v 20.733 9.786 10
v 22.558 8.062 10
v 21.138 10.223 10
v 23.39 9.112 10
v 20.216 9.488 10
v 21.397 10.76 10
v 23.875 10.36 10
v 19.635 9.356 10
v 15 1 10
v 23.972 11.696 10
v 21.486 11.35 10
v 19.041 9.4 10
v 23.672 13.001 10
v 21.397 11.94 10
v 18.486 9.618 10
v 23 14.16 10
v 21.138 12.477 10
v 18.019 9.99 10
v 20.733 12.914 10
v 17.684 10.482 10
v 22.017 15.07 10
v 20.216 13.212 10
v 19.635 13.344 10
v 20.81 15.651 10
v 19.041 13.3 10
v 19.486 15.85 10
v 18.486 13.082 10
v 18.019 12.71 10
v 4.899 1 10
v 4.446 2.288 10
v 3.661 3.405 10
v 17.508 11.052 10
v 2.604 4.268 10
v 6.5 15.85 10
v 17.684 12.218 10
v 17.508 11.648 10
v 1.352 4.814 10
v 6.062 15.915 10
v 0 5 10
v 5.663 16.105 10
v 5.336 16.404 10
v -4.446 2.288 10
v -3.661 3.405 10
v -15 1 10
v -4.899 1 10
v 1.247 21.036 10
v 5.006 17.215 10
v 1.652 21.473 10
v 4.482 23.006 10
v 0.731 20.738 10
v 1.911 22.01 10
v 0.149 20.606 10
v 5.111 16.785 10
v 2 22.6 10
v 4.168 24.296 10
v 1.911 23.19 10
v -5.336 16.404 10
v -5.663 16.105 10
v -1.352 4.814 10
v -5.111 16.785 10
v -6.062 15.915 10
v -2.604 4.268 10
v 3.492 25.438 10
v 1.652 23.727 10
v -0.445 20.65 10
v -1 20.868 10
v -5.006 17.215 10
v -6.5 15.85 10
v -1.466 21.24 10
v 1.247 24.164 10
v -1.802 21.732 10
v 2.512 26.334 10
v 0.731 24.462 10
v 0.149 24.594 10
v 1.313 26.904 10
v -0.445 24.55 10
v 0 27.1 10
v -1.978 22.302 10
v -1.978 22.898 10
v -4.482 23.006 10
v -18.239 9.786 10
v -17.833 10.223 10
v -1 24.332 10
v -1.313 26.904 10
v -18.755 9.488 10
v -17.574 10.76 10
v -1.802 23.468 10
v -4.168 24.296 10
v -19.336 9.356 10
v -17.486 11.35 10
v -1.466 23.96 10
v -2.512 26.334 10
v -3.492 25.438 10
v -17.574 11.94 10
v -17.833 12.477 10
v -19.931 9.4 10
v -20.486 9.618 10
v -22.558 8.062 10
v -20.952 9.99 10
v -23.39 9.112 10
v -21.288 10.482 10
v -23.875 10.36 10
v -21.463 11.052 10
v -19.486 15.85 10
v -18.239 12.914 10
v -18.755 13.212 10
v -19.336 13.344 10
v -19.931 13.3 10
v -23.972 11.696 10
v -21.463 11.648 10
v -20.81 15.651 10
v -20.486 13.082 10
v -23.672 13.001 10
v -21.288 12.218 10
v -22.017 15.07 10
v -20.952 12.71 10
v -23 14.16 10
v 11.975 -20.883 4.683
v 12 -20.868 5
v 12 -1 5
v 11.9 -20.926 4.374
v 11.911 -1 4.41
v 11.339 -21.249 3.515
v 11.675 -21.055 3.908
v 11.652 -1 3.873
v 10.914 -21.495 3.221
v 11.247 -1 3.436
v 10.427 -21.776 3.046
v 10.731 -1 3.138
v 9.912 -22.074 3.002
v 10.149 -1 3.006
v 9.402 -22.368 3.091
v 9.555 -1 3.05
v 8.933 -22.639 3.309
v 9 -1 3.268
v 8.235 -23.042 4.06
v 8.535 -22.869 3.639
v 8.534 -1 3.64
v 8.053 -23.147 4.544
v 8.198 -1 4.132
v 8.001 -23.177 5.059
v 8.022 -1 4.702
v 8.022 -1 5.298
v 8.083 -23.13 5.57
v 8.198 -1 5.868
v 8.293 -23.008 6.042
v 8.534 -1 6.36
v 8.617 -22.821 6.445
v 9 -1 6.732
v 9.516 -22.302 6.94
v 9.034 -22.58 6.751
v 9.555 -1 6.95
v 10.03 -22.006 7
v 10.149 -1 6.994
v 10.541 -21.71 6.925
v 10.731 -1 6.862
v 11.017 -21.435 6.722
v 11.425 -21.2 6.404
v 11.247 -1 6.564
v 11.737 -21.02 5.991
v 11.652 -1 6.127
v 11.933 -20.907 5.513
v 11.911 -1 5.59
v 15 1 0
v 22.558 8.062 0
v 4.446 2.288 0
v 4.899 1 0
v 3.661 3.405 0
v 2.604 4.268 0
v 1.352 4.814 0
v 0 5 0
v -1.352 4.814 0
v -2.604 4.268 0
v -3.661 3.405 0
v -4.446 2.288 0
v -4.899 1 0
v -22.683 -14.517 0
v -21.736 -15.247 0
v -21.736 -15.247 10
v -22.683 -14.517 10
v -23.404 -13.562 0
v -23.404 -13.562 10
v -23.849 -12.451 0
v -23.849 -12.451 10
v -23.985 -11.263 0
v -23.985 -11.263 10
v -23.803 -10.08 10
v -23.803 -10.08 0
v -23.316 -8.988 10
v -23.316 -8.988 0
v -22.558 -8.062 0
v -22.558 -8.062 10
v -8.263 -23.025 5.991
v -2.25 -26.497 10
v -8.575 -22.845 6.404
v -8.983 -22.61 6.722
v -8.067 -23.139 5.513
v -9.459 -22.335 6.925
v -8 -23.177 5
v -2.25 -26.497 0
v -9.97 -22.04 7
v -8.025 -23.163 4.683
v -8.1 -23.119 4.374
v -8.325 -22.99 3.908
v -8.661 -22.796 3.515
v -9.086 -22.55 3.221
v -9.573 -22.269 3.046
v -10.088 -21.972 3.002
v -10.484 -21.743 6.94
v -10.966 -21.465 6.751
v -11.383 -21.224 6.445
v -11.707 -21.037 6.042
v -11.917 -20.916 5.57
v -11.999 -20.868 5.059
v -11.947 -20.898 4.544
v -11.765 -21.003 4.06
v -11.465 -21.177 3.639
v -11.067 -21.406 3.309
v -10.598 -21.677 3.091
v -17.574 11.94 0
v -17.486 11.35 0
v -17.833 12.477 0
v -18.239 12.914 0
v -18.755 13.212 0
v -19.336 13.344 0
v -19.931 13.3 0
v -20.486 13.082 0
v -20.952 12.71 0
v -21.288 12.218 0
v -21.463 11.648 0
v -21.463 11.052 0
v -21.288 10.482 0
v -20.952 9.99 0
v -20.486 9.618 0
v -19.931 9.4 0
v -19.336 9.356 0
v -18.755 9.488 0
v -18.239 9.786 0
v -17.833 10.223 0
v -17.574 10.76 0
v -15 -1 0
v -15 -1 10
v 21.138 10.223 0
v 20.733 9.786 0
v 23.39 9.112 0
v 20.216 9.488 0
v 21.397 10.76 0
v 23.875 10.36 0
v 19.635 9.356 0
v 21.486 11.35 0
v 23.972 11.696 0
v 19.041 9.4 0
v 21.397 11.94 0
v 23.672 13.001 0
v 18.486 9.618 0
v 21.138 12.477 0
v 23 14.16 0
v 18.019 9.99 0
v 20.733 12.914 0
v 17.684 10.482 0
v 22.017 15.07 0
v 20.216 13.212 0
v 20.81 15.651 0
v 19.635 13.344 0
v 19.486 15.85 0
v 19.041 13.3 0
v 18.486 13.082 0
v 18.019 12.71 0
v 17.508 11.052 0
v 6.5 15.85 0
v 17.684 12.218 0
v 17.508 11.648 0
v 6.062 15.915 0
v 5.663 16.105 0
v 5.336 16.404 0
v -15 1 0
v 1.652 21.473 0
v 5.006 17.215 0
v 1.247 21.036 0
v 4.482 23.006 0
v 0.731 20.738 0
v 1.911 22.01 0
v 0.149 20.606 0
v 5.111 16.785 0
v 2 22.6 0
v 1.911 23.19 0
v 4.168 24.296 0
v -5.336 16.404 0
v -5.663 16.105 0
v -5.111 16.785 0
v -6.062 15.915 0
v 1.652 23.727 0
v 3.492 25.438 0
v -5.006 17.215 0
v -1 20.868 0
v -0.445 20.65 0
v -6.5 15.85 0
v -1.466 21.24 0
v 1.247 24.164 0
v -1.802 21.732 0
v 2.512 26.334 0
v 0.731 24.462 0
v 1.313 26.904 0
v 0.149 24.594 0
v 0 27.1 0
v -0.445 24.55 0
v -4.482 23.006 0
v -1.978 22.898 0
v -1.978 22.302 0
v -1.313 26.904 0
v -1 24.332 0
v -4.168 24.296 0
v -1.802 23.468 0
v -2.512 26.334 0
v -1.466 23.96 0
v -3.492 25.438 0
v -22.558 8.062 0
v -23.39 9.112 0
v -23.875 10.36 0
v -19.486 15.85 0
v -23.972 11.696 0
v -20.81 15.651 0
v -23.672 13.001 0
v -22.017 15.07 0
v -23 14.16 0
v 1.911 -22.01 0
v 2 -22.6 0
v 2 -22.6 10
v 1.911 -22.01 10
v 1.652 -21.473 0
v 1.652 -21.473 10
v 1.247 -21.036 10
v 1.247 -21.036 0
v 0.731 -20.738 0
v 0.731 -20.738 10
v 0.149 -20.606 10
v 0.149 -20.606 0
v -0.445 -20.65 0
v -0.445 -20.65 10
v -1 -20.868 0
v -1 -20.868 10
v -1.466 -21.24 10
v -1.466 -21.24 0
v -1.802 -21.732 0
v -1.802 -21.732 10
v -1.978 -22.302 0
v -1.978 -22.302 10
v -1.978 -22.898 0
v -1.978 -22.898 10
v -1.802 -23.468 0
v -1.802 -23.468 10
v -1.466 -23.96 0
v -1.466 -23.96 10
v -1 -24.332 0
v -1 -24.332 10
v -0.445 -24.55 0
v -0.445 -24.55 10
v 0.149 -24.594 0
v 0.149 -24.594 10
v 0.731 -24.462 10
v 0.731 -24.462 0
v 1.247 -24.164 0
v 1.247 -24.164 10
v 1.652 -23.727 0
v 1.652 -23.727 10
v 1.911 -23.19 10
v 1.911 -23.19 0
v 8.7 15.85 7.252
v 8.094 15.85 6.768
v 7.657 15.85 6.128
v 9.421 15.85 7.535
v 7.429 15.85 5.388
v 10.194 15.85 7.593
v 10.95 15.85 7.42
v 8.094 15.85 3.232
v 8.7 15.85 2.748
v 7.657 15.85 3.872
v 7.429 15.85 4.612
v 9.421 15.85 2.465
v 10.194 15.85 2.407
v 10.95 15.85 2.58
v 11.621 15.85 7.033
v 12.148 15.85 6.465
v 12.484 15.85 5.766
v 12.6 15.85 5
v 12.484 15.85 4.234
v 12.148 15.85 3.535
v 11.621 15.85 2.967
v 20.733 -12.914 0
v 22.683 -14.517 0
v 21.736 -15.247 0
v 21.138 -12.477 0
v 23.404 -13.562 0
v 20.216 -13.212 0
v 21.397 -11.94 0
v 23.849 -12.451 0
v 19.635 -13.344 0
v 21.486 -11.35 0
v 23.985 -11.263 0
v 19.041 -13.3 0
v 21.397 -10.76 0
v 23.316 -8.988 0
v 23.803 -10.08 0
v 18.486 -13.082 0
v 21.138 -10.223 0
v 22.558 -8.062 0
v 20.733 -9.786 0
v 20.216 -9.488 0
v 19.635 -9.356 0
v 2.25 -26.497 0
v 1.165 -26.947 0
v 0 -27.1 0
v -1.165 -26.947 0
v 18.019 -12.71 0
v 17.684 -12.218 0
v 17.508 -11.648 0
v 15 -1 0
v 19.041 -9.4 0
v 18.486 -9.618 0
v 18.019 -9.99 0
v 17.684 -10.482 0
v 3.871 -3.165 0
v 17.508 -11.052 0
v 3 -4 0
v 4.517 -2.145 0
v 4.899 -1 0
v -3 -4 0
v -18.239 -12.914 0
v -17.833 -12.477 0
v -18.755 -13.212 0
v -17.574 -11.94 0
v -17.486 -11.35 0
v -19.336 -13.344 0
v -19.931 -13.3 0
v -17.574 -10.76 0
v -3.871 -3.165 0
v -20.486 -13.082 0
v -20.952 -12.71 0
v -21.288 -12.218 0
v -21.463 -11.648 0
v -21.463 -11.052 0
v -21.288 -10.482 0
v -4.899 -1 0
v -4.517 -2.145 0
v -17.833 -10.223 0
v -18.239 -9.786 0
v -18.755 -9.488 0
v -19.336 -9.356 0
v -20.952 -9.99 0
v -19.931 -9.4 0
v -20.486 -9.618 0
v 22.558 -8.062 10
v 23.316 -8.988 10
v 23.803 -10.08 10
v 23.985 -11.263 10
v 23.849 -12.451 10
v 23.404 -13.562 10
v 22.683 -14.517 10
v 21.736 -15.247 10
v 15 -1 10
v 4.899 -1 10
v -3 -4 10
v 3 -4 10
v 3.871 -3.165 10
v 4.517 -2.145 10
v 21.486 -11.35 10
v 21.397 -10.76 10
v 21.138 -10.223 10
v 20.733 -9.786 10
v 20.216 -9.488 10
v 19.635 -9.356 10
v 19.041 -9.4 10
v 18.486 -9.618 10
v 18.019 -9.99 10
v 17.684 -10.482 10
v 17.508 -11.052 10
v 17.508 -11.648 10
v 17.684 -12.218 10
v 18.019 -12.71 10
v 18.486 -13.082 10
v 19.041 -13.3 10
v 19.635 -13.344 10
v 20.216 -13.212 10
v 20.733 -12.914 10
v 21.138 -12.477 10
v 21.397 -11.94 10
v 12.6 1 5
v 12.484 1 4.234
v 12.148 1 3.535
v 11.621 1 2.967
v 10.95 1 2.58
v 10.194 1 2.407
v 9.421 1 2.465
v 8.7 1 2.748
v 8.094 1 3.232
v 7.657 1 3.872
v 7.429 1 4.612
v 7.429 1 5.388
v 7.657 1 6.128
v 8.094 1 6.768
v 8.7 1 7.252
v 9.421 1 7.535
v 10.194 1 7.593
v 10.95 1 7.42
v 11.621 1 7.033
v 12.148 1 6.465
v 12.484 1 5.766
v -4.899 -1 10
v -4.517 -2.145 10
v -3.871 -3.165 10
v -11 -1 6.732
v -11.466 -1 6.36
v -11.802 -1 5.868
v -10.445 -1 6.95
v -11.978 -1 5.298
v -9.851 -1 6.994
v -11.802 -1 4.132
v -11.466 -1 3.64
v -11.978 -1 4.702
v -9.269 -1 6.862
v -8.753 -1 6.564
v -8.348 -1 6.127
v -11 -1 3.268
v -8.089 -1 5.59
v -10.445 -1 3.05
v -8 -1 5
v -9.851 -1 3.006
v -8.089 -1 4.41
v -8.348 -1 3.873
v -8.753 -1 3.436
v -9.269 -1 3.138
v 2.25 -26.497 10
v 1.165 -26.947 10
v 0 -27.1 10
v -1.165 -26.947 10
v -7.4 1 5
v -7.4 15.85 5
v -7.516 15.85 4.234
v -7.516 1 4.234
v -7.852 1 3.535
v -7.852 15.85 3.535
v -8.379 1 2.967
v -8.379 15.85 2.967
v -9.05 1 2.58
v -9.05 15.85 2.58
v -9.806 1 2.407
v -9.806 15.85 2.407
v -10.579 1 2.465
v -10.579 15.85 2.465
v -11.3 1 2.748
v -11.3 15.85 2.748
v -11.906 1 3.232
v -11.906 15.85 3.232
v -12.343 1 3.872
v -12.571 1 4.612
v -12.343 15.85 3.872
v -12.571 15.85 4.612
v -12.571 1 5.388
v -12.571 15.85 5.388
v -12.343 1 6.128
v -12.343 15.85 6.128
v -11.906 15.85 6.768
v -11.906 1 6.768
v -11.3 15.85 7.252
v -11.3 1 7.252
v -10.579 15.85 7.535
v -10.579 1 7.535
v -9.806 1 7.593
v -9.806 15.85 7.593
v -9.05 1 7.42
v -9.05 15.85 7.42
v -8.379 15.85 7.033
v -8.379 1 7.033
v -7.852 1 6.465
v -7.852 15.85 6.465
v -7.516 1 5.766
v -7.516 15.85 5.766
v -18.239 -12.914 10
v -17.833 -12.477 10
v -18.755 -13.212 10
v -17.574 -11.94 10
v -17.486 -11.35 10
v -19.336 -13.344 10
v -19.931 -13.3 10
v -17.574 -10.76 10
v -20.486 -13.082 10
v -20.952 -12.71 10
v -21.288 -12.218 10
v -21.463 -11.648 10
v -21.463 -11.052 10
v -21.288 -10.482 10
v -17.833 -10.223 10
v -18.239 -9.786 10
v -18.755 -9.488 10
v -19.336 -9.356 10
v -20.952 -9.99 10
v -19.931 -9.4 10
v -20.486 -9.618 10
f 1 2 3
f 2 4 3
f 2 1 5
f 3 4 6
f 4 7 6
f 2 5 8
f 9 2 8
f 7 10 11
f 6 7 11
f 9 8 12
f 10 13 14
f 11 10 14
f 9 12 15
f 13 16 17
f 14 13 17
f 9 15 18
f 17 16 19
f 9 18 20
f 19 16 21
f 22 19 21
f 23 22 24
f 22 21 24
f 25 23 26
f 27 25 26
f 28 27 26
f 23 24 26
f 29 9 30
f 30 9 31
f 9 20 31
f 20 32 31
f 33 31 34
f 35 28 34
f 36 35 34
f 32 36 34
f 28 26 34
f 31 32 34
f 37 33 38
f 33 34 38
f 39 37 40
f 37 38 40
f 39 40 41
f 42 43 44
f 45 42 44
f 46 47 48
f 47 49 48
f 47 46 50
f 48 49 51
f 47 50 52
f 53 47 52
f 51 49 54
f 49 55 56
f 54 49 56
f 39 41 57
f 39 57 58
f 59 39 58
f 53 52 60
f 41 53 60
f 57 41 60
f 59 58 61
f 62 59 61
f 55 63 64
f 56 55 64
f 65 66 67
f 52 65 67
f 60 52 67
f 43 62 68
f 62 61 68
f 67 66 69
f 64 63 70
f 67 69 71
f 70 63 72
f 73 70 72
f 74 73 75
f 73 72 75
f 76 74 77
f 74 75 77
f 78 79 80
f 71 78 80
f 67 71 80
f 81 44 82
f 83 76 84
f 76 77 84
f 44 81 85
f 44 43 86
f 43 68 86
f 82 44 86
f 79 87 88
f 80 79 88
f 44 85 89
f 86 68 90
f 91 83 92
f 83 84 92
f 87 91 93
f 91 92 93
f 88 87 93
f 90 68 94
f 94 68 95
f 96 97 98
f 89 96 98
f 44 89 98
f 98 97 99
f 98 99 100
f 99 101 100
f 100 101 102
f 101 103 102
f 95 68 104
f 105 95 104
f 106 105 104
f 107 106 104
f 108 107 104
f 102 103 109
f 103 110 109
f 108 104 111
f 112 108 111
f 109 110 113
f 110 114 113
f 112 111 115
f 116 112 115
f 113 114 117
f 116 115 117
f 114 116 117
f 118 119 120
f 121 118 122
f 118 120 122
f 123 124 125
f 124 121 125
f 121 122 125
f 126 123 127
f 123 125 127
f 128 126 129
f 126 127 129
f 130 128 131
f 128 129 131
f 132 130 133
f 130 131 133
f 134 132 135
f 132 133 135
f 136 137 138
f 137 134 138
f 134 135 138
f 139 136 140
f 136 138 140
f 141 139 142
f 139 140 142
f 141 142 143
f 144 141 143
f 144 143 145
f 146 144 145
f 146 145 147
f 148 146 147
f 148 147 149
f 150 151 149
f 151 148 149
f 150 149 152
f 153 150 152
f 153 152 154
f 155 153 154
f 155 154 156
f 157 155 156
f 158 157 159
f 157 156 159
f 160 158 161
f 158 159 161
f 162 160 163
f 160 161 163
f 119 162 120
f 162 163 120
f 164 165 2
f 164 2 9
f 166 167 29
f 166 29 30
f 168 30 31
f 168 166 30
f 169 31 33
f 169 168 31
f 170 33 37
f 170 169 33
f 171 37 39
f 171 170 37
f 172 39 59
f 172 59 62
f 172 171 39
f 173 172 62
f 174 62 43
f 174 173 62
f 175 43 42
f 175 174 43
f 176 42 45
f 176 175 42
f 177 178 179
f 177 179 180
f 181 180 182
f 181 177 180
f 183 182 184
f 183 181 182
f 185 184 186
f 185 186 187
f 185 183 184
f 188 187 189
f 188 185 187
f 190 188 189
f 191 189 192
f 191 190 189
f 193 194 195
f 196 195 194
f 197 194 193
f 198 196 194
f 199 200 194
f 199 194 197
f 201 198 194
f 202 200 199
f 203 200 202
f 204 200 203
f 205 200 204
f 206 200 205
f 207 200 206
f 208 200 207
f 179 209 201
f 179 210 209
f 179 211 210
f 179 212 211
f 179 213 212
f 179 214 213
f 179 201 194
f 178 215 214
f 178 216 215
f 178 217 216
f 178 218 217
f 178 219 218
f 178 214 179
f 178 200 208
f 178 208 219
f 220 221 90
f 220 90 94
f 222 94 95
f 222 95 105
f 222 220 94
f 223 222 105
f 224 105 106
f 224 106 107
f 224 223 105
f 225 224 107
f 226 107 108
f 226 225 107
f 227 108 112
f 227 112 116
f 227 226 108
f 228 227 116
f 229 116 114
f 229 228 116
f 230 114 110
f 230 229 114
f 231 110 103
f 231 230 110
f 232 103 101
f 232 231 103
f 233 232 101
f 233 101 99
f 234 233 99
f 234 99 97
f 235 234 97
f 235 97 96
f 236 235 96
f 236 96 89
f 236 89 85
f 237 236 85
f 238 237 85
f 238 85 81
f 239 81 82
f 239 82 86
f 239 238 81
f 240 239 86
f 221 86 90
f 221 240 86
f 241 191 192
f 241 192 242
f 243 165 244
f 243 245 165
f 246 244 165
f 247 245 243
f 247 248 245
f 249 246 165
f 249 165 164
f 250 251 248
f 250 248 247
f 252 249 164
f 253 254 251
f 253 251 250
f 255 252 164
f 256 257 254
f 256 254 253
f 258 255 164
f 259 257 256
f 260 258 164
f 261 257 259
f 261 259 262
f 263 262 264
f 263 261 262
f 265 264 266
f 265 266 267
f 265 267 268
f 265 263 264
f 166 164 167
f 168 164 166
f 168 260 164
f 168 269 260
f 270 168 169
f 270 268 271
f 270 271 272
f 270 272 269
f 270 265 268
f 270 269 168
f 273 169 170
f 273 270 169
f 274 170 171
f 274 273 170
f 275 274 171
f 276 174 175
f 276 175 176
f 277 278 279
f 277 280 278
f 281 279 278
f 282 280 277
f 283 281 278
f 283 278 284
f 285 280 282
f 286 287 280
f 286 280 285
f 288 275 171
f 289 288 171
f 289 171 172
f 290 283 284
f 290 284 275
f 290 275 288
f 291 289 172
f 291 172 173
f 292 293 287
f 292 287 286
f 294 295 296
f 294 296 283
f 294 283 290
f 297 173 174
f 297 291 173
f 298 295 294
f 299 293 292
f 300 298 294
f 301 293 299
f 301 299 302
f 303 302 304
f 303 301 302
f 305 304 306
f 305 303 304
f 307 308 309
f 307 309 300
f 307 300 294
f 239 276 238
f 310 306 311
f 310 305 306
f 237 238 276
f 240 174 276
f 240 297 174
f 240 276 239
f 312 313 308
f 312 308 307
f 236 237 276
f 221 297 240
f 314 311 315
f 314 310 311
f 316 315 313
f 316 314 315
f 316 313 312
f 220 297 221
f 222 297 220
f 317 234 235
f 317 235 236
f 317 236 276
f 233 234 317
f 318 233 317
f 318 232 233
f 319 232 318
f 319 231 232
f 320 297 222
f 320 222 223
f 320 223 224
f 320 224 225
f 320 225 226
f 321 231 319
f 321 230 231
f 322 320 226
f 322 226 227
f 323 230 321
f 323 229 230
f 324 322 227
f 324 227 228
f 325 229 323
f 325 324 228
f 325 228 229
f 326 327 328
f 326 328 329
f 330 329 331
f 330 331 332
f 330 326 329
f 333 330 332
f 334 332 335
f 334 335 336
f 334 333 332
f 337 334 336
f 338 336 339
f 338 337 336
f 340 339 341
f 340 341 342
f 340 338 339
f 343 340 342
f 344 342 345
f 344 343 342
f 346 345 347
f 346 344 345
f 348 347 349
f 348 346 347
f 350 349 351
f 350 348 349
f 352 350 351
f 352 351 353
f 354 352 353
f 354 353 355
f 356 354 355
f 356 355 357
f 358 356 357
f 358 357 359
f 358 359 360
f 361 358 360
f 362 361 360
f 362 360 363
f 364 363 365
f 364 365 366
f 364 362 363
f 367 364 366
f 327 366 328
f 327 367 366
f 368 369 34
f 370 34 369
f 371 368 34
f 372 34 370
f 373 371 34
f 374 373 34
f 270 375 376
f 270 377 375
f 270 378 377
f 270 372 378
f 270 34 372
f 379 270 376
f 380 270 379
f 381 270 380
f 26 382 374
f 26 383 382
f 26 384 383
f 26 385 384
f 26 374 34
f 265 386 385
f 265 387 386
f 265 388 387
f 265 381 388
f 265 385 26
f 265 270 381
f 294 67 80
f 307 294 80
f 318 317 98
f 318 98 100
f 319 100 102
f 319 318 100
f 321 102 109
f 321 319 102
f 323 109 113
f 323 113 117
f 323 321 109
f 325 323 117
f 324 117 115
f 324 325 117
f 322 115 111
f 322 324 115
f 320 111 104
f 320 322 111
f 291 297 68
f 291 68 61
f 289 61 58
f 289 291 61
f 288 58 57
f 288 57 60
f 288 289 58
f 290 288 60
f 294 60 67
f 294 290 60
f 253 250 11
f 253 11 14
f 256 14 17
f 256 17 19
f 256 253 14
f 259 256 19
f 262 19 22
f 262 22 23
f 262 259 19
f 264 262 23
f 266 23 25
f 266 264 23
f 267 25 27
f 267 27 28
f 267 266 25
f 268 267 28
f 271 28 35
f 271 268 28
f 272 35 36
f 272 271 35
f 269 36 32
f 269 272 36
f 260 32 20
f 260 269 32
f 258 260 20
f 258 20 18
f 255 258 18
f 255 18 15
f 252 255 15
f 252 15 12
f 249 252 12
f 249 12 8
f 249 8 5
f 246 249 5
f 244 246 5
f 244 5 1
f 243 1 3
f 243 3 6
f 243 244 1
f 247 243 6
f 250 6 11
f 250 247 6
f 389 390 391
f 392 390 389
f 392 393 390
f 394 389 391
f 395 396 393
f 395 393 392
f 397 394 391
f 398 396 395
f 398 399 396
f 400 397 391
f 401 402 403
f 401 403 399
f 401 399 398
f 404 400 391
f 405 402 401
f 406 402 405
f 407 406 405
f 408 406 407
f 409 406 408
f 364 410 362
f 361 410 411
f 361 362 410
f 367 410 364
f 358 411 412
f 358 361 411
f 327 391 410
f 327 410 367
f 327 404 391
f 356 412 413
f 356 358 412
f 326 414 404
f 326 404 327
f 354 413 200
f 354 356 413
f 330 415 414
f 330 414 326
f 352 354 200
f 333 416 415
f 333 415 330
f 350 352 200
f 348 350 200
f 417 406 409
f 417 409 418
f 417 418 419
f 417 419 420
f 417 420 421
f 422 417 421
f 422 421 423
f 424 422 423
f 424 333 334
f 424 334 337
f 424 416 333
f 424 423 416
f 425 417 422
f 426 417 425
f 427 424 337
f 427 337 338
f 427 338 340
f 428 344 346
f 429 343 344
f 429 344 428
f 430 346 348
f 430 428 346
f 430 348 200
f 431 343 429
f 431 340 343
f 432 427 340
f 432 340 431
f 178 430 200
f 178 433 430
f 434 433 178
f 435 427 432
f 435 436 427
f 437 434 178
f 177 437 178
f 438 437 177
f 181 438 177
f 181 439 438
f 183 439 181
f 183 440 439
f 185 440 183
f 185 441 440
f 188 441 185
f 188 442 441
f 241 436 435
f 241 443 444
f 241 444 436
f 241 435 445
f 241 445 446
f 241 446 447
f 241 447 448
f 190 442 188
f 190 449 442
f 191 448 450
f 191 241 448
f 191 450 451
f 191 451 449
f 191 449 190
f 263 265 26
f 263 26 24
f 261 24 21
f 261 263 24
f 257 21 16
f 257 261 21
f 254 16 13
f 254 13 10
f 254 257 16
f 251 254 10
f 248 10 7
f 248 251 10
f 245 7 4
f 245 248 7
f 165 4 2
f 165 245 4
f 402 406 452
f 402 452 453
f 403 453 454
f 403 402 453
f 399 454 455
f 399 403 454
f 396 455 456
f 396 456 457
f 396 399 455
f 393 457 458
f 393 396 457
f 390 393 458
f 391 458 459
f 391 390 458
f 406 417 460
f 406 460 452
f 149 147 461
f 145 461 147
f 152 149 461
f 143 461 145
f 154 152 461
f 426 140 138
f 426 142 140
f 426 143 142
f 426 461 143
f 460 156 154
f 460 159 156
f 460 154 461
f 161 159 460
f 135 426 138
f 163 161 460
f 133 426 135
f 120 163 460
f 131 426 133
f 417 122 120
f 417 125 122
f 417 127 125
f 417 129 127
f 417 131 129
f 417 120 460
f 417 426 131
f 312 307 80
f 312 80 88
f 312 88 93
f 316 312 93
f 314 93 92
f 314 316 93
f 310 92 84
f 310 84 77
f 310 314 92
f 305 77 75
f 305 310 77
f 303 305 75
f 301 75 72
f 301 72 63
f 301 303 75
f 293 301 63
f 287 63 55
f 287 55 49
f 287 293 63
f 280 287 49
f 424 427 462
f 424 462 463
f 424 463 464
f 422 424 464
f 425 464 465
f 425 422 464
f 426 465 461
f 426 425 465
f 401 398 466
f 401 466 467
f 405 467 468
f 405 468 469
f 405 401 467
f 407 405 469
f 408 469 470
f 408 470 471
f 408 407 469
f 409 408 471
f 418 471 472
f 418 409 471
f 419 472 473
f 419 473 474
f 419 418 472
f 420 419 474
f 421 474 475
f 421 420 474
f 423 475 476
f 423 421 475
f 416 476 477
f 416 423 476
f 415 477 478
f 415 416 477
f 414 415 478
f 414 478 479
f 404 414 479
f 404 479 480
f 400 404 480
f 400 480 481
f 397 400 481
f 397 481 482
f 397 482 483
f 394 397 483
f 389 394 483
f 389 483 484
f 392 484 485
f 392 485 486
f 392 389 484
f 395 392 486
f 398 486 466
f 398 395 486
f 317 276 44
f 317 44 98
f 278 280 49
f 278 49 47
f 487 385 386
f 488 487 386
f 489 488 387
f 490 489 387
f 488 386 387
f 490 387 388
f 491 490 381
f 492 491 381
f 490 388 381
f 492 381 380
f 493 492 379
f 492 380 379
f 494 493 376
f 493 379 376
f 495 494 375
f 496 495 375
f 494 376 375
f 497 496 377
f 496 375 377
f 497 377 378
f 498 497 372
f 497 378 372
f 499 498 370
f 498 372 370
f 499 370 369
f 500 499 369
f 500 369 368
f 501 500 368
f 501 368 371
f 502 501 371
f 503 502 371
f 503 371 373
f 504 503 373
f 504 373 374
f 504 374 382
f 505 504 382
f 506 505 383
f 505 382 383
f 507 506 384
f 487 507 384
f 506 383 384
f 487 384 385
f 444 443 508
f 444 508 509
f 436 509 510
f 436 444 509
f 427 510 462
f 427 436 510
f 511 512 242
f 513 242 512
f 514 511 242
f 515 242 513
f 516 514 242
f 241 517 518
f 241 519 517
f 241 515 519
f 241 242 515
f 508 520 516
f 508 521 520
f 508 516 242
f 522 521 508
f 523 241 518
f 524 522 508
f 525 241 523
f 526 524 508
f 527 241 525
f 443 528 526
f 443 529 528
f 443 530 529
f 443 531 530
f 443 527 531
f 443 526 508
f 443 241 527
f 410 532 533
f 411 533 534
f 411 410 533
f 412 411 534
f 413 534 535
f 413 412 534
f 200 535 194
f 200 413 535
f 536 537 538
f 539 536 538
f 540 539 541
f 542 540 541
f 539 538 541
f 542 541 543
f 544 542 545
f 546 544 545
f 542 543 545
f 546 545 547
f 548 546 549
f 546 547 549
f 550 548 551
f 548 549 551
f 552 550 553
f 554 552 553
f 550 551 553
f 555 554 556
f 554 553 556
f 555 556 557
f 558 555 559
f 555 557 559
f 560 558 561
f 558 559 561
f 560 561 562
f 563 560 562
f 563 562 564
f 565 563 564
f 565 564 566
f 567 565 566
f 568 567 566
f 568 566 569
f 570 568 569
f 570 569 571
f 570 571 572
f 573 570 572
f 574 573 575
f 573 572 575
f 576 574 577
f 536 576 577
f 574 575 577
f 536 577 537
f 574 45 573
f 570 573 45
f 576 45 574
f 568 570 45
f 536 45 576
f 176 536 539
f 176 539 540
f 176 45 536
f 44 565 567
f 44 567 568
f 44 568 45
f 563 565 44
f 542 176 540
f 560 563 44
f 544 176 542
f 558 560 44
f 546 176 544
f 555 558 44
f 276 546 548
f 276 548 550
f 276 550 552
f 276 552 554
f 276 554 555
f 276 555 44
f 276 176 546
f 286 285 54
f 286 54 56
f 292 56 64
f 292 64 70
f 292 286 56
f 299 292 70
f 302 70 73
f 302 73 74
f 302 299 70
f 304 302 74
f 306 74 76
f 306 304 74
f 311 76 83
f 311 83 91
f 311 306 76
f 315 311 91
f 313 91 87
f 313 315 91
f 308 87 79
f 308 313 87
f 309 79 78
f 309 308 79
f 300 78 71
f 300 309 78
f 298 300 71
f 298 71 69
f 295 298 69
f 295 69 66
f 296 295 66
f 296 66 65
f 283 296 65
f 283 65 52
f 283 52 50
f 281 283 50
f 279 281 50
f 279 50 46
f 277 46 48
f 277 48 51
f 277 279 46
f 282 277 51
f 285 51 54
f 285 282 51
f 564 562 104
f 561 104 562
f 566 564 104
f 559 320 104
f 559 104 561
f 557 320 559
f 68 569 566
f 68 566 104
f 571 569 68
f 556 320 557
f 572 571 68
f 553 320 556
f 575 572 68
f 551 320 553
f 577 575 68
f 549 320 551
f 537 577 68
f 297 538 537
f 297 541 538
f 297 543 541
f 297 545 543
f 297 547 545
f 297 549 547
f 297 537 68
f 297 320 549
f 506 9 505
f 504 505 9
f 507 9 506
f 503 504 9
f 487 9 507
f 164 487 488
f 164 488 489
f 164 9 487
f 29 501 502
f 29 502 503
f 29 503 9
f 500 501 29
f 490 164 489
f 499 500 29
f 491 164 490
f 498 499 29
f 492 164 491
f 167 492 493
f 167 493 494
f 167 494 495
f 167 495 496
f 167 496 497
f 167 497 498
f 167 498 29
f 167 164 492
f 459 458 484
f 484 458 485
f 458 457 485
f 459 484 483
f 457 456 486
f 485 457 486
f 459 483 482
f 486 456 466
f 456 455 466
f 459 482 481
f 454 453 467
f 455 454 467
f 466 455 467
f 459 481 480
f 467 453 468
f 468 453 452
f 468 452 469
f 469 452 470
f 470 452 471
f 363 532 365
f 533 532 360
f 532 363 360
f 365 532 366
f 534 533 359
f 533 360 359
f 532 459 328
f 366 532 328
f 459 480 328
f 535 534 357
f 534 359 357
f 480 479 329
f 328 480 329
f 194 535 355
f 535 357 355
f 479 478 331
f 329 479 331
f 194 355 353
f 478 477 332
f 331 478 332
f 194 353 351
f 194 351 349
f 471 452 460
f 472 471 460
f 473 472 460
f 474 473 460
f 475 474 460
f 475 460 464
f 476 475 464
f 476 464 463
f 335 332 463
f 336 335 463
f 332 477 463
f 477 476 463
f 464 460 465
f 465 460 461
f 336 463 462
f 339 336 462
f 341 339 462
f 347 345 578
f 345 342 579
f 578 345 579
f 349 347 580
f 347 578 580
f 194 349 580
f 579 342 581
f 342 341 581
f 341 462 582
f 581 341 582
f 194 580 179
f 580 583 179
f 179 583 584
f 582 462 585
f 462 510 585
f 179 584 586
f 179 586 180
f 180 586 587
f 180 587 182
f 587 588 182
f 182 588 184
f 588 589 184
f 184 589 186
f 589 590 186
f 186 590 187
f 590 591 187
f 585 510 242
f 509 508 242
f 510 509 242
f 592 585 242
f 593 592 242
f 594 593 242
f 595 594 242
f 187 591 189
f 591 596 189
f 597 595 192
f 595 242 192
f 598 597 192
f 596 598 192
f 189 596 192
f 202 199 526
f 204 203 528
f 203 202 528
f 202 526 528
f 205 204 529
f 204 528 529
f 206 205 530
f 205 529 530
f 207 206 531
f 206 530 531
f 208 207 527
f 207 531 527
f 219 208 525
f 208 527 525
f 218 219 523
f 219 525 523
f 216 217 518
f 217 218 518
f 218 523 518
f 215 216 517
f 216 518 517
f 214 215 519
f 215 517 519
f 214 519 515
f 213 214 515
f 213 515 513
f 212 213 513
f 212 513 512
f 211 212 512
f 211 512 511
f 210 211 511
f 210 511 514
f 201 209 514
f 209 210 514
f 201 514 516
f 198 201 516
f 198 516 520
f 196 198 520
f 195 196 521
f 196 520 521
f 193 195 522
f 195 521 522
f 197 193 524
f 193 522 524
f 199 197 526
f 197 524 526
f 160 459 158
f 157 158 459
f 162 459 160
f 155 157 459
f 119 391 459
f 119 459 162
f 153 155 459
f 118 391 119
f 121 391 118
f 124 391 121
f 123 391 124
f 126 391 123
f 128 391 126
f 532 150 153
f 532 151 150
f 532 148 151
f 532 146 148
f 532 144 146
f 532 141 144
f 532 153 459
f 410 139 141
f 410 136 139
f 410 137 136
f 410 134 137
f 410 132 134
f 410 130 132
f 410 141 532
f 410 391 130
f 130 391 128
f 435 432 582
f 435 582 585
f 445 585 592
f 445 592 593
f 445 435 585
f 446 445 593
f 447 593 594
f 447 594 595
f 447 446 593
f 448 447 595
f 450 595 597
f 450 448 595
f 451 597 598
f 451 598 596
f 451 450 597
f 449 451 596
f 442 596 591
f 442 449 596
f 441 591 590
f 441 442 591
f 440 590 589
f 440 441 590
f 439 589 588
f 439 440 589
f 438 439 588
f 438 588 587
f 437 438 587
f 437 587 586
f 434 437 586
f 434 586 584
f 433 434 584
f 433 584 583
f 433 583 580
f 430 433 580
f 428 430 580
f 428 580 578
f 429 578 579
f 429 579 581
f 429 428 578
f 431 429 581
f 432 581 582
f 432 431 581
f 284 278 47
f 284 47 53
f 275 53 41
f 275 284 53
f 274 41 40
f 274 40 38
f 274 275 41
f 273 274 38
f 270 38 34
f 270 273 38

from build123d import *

# Parameters (mm, degrees)
SKETCH_1_R          = 2
EXTRUDE_1_DEPTH     = 10
EXTRUDE_1_2_DEPTH   = 10
SKETCH_2_R          = 2.6
CUT_EXTRUDE_1_DEPTH = 14.85
SKETCH_3_R          = 2
CUT_EXTRUDE_2_DEPTH = 43.95


with BuildPart() as part:
    # 草图1 → 凸台-拉伸1 (new body)
    with BuildSketch(Plane.XY):
        with BuildLine():
            Line((-3, -4), (3, -4))
            ThreePointArc((3, -4), (4.224744871, -2.674234614), (4.898979486, -1))
            Line((4.898979486, -1), (15, -1))
            Line((15, -1), (22.557859125, -8.061983991))
            ThreePointArc((22.557859125, -8.061983991), (23.956389252, -11.861653581), (21.735571585, -15.247114317))
            Line((21.735571585, -15.247114317), (2.25, -26.497114317))
            ThreePointArc((2.25, -26.497114317), (0, -27.1), (-2.25, -26.497114317))
            Line((-2.25, -26.497114317), (-21.735571585, -15.247114317))
            ThreePointArc((-21.735571585, -15.247114317), (-23.956389252, -11.861653581), (-22.557859125, -8.061983991))
            Line((-22.557859125, -8.061983991), (-15, -1))
            Line((-15, -1), (-4.898979486, -1))
            ThreePointArc((-4.898979486, -1), (-4.224744871, -2.674234614), (-3, -4))
        make_face()
        with Locations((-19.485571585, -11.35)):
            Circle(SKETCH_1_R, mode=Mode.SUBTRACT)
        with Locations((0, -22.6)):
            Circle(SKETCH_1_R, mode=Mode.SUBTRACT)
        with Locations((19.485571585, -11.35)):
            Circle(SKETCH_1_R, mode=Mode.SUBTRACT)
    extrude(amount=EXTRUDE_1_DEPTH)

    # 草图3 → 切除-拉伸2 (cut, through all)
    with BuildSketch(Plane(origin=(0, 15.85, 0), x_dir=(1, 0, 0), z_dir=(0, 1, 0))):
        with Locations((-10, -5)):
            Circle(SKETCH_3_R)
        with Locations((10, -5)):
            Circle(SKETCH_3_R)
    extrude(amount=-CUT_EXTRUDE_2_DEPTH, mode=Mode.SUBTRACT)


with BuildPart() as body_2:
    # 草图1 → Extrude 1 2 (new body)
    with BuildSketch(Plane.XY):
        with BuildLine():
            Line((-15, 1), (-22.557859125, 8.061983991))
            ThreePointArc((-22.557859125, 8.061983991), (-23.671624143, 13.001352167), (-19.485571585, 15.85))
            Line((-19.485571585, 15.85), (-6.5, 15.85))
            ThreePointArc((-6.5, 15.85), (-5.488301483, 16.242540696), (-5.006113419, 17.214711852))
            Line((-5.006113419, 17.214711852), (-4.481659743, 23.005864444))
            ThreePointArc((-4.481659743, 23.005864444), (0, 27.1), (4.481659743, 23.005864444))
            Line((4.481659743, 23.005864444), (5.006113419, 17.214711852))
            ThreePointArc((5.006113419, 17.214711852), (5.488301483, 16.242540696), (6.5, 15.85))
            Line((6.5, 15.85), (19.485571585, 15.85))
            ThreePointArc((19.485571585, 15.85), (23.671624143, 13.001352167), (22.557859125, 8.061983991))
            Line((22.557859125, 8.061983991), (15, 1))
            Line((15, 1), (4.898979486, 1))
            ThreePointArc((4.898979486, 1), (0, 5), (-4.898979486, 1))
            Line((-4.898979486, 1), (-15, 1))
        make_face()
        with Locations((-19.485571585, 11.35)):
            Circle(SKETCH_1_R, mode=Mode.SUBTRACT)
        with Locations((0, 22.6)):
            Circle(SKETCH_1_R, mode=Mode.SUBTRACT)
        with Locations((19.485571585, 11.35)):
            Circle(SKETCH_1_R, mode=Mode.SUBTRACT)
    extrude(amount=EXTRUDE_1_2_DEPTH)

    # 草图2 → 切除-拉伸1 (cut)
    with BuildSketch(Plane(origin=(0, 15.85, 0), x_dir=(1, 0, 0), z_dir=(0, 1, 0))):
        with Locations((-10, -5)):
            Circle(SKETCH_2_R)
        with Locations((10, -5)):
            Circle(SKETCH_2_R)
    extrude(amount=-CUT_EXTRUDE_1_DEPTH, mode=Mode.SUBTRACT)


solid = Compound([part.part, body_2.part])
